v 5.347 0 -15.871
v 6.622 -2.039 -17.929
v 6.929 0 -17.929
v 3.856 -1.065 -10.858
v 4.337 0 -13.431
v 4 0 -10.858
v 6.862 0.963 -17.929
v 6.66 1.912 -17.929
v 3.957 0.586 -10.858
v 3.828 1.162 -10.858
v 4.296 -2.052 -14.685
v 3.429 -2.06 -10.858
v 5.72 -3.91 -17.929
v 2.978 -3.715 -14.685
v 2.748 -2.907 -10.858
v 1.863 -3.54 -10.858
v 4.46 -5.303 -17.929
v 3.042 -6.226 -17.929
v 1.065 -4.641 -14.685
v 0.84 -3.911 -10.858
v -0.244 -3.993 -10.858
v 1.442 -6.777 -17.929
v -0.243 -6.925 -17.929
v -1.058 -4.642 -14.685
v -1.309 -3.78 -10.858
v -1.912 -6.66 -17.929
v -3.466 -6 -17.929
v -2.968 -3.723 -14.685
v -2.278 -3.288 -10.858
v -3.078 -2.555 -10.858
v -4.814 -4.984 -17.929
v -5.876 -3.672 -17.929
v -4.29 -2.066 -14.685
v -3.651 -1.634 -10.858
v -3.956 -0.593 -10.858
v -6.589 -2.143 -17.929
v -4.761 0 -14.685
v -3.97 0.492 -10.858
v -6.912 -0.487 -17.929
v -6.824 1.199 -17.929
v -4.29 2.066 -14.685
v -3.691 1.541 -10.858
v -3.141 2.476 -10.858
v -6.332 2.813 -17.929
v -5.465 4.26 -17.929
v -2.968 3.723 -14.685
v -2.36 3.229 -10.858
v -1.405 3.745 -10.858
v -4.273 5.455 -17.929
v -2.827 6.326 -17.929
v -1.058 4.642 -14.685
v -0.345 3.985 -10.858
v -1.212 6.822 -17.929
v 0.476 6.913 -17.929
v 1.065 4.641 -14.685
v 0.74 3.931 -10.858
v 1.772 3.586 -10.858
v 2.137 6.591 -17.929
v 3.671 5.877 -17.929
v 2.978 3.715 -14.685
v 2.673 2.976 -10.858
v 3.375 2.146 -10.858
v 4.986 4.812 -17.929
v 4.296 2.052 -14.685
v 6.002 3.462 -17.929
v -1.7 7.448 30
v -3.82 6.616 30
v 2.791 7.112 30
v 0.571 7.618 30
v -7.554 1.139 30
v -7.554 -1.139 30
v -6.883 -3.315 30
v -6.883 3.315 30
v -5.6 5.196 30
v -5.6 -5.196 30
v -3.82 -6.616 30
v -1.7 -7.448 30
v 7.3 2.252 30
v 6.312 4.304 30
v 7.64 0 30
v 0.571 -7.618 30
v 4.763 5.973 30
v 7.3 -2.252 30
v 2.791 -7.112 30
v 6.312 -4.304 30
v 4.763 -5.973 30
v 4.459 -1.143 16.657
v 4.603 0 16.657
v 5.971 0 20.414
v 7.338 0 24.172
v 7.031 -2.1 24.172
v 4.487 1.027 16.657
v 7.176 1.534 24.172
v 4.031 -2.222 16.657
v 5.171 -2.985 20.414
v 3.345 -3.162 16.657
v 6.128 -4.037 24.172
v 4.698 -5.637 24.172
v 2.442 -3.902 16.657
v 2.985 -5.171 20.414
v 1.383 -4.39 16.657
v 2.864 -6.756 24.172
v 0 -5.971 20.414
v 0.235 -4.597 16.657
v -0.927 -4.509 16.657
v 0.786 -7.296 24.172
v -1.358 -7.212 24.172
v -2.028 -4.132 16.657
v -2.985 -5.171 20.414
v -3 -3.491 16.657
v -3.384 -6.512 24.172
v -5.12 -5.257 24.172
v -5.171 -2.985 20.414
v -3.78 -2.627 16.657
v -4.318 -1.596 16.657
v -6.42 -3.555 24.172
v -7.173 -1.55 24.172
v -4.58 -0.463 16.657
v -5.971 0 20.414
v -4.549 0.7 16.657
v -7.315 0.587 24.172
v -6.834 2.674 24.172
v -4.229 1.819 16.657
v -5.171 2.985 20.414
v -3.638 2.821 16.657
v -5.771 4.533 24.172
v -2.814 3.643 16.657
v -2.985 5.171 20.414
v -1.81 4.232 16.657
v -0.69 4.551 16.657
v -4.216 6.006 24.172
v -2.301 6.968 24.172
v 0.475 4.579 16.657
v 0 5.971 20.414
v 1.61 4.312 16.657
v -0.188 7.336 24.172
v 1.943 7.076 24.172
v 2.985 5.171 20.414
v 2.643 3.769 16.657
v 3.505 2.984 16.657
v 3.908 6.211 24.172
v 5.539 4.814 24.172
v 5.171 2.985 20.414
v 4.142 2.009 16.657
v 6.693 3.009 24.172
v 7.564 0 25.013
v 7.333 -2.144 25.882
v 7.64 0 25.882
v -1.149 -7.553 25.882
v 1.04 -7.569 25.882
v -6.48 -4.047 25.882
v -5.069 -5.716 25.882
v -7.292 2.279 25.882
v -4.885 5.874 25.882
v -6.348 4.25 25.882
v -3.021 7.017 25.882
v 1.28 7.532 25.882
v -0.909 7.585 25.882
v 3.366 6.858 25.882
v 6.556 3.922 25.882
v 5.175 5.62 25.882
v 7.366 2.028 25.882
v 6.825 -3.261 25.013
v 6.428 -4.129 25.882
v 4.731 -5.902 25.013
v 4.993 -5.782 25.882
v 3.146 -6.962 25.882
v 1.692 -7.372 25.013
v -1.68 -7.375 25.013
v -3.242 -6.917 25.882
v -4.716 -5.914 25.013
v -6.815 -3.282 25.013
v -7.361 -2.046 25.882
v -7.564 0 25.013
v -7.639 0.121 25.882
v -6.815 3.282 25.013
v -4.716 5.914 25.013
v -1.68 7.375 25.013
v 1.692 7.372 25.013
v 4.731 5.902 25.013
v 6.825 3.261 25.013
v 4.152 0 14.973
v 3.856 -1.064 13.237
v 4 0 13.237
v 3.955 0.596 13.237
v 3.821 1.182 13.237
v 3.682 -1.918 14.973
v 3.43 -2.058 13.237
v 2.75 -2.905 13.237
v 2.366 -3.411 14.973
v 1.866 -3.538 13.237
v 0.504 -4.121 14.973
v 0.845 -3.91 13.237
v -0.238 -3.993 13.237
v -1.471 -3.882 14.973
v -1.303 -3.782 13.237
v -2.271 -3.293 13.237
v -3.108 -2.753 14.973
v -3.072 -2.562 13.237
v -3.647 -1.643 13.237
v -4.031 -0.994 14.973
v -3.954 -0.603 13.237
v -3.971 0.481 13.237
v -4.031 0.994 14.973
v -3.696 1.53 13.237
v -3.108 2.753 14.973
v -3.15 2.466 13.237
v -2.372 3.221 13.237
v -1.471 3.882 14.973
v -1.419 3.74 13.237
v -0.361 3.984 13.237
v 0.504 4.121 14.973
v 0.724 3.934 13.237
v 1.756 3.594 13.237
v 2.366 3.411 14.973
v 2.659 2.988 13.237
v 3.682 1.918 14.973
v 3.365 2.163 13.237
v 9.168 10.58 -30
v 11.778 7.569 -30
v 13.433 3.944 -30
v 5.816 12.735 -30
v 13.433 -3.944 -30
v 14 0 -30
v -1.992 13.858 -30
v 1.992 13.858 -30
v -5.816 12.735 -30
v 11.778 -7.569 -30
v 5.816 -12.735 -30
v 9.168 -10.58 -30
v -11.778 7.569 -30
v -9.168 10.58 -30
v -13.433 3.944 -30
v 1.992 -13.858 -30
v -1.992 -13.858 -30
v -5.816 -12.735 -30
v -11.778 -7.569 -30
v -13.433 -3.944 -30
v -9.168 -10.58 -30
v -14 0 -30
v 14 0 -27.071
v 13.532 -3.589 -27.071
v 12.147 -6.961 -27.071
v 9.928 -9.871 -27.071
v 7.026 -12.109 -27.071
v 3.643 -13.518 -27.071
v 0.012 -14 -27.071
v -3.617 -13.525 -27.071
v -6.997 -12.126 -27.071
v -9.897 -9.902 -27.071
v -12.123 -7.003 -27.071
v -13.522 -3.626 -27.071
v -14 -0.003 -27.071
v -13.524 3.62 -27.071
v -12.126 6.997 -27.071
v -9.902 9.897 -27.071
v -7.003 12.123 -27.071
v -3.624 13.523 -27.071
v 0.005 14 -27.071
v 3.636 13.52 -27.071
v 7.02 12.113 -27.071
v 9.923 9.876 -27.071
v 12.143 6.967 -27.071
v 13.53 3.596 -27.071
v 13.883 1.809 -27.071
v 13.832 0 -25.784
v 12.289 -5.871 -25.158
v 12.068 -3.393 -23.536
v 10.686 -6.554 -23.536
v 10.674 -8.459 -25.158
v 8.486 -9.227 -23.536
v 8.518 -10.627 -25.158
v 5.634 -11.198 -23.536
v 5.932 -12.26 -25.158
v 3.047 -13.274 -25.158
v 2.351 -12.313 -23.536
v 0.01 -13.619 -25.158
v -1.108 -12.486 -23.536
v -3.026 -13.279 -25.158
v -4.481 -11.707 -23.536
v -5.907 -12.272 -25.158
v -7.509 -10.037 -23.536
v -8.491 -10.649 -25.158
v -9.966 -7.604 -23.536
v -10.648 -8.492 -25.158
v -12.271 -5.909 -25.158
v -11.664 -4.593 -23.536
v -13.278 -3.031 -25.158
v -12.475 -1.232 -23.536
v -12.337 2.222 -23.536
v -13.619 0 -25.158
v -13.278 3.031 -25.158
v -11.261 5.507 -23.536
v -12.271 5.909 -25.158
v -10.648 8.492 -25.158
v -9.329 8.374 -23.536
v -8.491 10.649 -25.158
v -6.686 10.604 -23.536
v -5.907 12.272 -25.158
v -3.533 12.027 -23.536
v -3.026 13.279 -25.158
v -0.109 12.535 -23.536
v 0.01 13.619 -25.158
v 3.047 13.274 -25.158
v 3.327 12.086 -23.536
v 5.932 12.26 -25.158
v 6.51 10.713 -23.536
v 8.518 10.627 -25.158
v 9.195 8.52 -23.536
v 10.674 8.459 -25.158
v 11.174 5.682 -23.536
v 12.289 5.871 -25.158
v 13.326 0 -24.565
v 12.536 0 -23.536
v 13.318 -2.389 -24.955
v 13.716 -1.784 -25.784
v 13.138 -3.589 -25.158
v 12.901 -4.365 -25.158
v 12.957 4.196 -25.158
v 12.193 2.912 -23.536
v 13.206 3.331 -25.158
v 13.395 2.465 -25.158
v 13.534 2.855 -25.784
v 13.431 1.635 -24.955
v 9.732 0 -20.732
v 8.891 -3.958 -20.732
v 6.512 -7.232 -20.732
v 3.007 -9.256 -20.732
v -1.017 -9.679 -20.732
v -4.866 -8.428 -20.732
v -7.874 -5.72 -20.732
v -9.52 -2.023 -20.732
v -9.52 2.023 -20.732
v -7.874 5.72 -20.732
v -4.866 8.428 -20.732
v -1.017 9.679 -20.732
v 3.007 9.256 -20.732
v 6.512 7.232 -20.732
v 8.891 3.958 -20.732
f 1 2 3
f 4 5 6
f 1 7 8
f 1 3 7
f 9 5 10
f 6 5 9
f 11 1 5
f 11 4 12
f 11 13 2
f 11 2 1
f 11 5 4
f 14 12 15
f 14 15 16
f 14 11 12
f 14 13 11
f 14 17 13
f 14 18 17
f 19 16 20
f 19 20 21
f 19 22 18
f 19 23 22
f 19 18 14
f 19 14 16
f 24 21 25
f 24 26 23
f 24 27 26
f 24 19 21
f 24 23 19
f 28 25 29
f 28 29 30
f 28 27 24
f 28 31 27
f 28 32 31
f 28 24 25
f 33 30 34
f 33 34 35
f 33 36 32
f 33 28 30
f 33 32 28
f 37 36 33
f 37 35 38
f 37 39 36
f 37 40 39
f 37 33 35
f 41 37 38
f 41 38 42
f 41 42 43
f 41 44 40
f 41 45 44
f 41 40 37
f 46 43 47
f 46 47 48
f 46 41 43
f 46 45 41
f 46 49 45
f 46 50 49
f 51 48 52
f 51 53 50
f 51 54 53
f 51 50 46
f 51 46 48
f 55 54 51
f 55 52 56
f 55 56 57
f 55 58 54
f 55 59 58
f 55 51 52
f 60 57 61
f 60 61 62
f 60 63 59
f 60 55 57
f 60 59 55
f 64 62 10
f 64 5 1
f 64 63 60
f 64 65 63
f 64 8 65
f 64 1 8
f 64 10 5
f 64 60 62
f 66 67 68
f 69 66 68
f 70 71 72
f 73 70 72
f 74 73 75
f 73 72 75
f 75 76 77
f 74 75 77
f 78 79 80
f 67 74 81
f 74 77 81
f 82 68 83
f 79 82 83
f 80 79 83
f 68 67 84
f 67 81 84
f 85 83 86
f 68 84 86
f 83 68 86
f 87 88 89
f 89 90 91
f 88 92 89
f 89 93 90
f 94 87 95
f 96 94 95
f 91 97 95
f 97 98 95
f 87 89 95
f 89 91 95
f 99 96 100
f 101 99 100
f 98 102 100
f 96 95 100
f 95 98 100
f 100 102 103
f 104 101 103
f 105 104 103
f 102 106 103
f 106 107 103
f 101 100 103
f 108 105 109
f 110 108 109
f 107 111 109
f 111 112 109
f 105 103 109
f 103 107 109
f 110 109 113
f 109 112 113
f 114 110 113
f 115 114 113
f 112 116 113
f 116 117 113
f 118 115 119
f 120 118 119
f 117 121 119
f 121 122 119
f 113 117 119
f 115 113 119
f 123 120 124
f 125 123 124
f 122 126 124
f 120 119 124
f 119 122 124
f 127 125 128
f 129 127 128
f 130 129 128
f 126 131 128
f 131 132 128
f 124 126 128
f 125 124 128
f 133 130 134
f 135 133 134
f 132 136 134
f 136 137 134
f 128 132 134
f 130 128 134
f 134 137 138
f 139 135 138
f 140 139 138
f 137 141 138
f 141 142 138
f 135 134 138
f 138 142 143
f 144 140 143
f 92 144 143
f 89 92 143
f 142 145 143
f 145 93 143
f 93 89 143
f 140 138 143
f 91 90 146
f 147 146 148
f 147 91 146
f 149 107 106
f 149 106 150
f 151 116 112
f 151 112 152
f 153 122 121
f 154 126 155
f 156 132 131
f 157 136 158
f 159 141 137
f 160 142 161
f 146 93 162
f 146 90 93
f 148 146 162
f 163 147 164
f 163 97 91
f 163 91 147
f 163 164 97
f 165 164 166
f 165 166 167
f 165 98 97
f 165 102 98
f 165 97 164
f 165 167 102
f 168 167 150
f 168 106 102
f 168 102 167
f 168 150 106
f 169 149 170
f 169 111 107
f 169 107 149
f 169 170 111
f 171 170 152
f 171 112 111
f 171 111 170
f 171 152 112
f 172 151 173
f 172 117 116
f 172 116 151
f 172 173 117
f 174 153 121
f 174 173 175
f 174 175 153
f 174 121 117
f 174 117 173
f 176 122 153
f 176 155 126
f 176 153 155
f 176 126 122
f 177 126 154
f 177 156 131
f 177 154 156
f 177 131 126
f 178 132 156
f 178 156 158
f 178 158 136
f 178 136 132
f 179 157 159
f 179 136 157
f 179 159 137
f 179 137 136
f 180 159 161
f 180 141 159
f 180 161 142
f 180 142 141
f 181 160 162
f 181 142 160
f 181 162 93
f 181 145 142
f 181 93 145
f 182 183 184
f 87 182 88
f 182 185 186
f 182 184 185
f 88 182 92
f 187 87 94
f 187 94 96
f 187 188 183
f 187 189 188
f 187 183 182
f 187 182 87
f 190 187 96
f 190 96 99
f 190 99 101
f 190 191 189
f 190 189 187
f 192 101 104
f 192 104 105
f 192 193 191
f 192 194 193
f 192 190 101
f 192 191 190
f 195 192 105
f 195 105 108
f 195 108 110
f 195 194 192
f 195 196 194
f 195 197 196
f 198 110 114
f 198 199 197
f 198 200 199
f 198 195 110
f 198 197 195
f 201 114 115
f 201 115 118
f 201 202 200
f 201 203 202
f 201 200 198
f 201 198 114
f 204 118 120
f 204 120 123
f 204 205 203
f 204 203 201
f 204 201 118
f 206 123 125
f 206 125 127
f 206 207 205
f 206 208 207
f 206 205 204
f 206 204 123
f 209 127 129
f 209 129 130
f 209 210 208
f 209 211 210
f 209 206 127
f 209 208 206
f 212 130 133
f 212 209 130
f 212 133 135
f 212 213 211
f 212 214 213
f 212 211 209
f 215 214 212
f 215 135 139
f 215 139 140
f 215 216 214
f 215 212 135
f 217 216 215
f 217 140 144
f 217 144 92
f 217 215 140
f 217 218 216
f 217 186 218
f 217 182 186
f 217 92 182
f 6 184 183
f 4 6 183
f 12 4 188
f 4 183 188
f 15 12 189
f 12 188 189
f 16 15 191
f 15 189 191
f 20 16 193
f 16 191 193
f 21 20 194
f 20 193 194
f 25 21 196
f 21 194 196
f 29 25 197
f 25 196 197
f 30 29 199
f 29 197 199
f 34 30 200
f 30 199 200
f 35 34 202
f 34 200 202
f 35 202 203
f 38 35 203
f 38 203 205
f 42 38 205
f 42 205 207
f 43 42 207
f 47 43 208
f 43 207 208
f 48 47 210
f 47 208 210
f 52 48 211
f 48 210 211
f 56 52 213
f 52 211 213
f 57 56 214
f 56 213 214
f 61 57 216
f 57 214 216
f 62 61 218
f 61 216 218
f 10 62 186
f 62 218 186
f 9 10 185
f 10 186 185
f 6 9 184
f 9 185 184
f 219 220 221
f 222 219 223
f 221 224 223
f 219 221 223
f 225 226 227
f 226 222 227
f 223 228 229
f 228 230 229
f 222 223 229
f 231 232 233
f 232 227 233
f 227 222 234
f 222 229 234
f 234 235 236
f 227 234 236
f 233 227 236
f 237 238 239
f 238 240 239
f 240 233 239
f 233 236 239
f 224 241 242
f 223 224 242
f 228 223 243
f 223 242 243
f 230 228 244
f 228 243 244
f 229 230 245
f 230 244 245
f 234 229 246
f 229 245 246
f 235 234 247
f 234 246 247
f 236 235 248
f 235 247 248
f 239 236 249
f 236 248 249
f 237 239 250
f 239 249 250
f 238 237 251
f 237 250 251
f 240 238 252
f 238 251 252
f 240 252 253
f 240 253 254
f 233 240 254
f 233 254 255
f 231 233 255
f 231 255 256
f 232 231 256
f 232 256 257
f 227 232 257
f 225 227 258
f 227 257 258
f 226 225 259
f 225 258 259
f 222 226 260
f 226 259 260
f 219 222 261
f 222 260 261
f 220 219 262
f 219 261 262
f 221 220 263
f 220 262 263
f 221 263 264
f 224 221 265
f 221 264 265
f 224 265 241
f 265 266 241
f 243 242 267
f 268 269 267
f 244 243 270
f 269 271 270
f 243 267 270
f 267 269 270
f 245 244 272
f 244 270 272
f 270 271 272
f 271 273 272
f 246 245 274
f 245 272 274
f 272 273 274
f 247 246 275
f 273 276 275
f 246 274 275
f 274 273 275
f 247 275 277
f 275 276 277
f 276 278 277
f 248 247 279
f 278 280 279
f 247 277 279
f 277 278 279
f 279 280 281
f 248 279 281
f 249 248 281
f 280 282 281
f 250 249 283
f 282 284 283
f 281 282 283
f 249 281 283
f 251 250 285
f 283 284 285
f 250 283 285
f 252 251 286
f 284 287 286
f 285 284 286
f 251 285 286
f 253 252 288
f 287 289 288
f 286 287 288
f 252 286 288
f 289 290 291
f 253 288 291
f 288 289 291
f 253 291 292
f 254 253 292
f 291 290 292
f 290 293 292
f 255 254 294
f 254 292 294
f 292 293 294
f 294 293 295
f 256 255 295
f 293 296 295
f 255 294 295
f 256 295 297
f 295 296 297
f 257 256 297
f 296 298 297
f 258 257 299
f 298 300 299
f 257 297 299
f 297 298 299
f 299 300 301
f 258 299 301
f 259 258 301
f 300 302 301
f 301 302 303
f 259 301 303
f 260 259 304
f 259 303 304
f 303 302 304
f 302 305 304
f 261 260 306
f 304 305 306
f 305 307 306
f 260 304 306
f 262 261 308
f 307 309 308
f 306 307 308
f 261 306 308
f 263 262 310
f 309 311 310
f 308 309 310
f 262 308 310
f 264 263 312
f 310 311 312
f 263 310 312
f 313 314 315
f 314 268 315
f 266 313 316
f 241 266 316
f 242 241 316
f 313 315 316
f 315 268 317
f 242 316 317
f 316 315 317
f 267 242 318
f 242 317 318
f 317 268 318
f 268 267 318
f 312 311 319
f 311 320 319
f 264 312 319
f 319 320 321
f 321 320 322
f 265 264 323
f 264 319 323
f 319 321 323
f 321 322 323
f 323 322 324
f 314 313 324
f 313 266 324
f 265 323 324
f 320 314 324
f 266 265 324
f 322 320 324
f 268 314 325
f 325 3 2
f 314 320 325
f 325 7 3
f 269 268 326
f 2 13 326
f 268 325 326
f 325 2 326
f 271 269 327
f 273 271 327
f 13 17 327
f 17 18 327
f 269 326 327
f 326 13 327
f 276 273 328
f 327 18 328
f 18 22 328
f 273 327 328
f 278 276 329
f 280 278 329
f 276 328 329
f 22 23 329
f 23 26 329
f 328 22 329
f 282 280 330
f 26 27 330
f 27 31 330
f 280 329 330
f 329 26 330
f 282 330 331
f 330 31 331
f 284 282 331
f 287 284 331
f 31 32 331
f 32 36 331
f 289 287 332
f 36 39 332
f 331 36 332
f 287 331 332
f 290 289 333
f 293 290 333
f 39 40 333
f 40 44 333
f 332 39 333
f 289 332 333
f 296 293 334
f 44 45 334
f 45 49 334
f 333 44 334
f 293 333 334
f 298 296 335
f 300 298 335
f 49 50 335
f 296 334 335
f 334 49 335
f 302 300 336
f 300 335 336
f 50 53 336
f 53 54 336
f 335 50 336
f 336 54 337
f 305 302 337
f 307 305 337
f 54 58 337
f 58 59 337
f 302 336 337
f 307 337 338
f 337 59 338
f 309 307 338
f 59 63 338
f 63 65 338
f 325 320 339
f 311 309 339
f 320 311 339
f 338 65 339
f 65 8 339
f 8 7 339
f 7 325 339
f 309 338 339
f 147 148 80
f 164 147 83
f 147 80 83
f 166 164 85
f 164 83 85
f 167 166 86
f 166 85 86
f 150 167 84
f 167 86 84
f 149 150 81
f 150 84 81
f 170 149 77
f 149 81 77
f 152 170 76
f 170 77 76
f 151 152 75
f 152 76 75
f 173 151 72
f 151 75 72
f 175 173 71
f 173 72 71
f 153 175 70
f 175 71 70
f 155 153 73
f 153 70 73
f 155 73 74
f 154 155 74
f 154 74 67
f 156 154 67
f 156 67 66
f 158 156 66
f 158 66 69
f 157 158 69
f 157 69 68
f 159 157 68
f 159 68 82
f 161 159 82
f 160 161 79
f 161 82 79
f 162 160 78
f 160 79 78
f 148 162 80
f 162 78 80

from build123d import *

# Parameters (mm, degrees)
F2_R = 10
F3_R = 5


with BuildPart() as f1:
    # F0 (on Front) → F1 (revolve)
    with BuildSketch(Plane.XZ):
        Polygon((7.6397023427, 30), (0, 30), (0, -30), (7.6397023427, -30), (14, -30), (14, -25), (4, -15), (4, 0), (4, 15), (7.6397023427, 25), align=None)
    revolve(axis=Axis((0, 0, 0), (0, 0, -1)))

    # F2
    f2_edges = [f1.edges().sort_by_distance(p)[0] for p in [
        (-4, 0, 15),
        (-4, 0, -15),
    ]]
    fillet(f2_edges, radius=F2_R)

    # F3
    f3_edges = [f1.edges().sort_by_distance(p)[0] for p in [
        (-7.639702, 0, 25),
        (-14, 0, -25),
    ]]
    fillet(f3_edges, radius=F3_R)


solid = f1.part
